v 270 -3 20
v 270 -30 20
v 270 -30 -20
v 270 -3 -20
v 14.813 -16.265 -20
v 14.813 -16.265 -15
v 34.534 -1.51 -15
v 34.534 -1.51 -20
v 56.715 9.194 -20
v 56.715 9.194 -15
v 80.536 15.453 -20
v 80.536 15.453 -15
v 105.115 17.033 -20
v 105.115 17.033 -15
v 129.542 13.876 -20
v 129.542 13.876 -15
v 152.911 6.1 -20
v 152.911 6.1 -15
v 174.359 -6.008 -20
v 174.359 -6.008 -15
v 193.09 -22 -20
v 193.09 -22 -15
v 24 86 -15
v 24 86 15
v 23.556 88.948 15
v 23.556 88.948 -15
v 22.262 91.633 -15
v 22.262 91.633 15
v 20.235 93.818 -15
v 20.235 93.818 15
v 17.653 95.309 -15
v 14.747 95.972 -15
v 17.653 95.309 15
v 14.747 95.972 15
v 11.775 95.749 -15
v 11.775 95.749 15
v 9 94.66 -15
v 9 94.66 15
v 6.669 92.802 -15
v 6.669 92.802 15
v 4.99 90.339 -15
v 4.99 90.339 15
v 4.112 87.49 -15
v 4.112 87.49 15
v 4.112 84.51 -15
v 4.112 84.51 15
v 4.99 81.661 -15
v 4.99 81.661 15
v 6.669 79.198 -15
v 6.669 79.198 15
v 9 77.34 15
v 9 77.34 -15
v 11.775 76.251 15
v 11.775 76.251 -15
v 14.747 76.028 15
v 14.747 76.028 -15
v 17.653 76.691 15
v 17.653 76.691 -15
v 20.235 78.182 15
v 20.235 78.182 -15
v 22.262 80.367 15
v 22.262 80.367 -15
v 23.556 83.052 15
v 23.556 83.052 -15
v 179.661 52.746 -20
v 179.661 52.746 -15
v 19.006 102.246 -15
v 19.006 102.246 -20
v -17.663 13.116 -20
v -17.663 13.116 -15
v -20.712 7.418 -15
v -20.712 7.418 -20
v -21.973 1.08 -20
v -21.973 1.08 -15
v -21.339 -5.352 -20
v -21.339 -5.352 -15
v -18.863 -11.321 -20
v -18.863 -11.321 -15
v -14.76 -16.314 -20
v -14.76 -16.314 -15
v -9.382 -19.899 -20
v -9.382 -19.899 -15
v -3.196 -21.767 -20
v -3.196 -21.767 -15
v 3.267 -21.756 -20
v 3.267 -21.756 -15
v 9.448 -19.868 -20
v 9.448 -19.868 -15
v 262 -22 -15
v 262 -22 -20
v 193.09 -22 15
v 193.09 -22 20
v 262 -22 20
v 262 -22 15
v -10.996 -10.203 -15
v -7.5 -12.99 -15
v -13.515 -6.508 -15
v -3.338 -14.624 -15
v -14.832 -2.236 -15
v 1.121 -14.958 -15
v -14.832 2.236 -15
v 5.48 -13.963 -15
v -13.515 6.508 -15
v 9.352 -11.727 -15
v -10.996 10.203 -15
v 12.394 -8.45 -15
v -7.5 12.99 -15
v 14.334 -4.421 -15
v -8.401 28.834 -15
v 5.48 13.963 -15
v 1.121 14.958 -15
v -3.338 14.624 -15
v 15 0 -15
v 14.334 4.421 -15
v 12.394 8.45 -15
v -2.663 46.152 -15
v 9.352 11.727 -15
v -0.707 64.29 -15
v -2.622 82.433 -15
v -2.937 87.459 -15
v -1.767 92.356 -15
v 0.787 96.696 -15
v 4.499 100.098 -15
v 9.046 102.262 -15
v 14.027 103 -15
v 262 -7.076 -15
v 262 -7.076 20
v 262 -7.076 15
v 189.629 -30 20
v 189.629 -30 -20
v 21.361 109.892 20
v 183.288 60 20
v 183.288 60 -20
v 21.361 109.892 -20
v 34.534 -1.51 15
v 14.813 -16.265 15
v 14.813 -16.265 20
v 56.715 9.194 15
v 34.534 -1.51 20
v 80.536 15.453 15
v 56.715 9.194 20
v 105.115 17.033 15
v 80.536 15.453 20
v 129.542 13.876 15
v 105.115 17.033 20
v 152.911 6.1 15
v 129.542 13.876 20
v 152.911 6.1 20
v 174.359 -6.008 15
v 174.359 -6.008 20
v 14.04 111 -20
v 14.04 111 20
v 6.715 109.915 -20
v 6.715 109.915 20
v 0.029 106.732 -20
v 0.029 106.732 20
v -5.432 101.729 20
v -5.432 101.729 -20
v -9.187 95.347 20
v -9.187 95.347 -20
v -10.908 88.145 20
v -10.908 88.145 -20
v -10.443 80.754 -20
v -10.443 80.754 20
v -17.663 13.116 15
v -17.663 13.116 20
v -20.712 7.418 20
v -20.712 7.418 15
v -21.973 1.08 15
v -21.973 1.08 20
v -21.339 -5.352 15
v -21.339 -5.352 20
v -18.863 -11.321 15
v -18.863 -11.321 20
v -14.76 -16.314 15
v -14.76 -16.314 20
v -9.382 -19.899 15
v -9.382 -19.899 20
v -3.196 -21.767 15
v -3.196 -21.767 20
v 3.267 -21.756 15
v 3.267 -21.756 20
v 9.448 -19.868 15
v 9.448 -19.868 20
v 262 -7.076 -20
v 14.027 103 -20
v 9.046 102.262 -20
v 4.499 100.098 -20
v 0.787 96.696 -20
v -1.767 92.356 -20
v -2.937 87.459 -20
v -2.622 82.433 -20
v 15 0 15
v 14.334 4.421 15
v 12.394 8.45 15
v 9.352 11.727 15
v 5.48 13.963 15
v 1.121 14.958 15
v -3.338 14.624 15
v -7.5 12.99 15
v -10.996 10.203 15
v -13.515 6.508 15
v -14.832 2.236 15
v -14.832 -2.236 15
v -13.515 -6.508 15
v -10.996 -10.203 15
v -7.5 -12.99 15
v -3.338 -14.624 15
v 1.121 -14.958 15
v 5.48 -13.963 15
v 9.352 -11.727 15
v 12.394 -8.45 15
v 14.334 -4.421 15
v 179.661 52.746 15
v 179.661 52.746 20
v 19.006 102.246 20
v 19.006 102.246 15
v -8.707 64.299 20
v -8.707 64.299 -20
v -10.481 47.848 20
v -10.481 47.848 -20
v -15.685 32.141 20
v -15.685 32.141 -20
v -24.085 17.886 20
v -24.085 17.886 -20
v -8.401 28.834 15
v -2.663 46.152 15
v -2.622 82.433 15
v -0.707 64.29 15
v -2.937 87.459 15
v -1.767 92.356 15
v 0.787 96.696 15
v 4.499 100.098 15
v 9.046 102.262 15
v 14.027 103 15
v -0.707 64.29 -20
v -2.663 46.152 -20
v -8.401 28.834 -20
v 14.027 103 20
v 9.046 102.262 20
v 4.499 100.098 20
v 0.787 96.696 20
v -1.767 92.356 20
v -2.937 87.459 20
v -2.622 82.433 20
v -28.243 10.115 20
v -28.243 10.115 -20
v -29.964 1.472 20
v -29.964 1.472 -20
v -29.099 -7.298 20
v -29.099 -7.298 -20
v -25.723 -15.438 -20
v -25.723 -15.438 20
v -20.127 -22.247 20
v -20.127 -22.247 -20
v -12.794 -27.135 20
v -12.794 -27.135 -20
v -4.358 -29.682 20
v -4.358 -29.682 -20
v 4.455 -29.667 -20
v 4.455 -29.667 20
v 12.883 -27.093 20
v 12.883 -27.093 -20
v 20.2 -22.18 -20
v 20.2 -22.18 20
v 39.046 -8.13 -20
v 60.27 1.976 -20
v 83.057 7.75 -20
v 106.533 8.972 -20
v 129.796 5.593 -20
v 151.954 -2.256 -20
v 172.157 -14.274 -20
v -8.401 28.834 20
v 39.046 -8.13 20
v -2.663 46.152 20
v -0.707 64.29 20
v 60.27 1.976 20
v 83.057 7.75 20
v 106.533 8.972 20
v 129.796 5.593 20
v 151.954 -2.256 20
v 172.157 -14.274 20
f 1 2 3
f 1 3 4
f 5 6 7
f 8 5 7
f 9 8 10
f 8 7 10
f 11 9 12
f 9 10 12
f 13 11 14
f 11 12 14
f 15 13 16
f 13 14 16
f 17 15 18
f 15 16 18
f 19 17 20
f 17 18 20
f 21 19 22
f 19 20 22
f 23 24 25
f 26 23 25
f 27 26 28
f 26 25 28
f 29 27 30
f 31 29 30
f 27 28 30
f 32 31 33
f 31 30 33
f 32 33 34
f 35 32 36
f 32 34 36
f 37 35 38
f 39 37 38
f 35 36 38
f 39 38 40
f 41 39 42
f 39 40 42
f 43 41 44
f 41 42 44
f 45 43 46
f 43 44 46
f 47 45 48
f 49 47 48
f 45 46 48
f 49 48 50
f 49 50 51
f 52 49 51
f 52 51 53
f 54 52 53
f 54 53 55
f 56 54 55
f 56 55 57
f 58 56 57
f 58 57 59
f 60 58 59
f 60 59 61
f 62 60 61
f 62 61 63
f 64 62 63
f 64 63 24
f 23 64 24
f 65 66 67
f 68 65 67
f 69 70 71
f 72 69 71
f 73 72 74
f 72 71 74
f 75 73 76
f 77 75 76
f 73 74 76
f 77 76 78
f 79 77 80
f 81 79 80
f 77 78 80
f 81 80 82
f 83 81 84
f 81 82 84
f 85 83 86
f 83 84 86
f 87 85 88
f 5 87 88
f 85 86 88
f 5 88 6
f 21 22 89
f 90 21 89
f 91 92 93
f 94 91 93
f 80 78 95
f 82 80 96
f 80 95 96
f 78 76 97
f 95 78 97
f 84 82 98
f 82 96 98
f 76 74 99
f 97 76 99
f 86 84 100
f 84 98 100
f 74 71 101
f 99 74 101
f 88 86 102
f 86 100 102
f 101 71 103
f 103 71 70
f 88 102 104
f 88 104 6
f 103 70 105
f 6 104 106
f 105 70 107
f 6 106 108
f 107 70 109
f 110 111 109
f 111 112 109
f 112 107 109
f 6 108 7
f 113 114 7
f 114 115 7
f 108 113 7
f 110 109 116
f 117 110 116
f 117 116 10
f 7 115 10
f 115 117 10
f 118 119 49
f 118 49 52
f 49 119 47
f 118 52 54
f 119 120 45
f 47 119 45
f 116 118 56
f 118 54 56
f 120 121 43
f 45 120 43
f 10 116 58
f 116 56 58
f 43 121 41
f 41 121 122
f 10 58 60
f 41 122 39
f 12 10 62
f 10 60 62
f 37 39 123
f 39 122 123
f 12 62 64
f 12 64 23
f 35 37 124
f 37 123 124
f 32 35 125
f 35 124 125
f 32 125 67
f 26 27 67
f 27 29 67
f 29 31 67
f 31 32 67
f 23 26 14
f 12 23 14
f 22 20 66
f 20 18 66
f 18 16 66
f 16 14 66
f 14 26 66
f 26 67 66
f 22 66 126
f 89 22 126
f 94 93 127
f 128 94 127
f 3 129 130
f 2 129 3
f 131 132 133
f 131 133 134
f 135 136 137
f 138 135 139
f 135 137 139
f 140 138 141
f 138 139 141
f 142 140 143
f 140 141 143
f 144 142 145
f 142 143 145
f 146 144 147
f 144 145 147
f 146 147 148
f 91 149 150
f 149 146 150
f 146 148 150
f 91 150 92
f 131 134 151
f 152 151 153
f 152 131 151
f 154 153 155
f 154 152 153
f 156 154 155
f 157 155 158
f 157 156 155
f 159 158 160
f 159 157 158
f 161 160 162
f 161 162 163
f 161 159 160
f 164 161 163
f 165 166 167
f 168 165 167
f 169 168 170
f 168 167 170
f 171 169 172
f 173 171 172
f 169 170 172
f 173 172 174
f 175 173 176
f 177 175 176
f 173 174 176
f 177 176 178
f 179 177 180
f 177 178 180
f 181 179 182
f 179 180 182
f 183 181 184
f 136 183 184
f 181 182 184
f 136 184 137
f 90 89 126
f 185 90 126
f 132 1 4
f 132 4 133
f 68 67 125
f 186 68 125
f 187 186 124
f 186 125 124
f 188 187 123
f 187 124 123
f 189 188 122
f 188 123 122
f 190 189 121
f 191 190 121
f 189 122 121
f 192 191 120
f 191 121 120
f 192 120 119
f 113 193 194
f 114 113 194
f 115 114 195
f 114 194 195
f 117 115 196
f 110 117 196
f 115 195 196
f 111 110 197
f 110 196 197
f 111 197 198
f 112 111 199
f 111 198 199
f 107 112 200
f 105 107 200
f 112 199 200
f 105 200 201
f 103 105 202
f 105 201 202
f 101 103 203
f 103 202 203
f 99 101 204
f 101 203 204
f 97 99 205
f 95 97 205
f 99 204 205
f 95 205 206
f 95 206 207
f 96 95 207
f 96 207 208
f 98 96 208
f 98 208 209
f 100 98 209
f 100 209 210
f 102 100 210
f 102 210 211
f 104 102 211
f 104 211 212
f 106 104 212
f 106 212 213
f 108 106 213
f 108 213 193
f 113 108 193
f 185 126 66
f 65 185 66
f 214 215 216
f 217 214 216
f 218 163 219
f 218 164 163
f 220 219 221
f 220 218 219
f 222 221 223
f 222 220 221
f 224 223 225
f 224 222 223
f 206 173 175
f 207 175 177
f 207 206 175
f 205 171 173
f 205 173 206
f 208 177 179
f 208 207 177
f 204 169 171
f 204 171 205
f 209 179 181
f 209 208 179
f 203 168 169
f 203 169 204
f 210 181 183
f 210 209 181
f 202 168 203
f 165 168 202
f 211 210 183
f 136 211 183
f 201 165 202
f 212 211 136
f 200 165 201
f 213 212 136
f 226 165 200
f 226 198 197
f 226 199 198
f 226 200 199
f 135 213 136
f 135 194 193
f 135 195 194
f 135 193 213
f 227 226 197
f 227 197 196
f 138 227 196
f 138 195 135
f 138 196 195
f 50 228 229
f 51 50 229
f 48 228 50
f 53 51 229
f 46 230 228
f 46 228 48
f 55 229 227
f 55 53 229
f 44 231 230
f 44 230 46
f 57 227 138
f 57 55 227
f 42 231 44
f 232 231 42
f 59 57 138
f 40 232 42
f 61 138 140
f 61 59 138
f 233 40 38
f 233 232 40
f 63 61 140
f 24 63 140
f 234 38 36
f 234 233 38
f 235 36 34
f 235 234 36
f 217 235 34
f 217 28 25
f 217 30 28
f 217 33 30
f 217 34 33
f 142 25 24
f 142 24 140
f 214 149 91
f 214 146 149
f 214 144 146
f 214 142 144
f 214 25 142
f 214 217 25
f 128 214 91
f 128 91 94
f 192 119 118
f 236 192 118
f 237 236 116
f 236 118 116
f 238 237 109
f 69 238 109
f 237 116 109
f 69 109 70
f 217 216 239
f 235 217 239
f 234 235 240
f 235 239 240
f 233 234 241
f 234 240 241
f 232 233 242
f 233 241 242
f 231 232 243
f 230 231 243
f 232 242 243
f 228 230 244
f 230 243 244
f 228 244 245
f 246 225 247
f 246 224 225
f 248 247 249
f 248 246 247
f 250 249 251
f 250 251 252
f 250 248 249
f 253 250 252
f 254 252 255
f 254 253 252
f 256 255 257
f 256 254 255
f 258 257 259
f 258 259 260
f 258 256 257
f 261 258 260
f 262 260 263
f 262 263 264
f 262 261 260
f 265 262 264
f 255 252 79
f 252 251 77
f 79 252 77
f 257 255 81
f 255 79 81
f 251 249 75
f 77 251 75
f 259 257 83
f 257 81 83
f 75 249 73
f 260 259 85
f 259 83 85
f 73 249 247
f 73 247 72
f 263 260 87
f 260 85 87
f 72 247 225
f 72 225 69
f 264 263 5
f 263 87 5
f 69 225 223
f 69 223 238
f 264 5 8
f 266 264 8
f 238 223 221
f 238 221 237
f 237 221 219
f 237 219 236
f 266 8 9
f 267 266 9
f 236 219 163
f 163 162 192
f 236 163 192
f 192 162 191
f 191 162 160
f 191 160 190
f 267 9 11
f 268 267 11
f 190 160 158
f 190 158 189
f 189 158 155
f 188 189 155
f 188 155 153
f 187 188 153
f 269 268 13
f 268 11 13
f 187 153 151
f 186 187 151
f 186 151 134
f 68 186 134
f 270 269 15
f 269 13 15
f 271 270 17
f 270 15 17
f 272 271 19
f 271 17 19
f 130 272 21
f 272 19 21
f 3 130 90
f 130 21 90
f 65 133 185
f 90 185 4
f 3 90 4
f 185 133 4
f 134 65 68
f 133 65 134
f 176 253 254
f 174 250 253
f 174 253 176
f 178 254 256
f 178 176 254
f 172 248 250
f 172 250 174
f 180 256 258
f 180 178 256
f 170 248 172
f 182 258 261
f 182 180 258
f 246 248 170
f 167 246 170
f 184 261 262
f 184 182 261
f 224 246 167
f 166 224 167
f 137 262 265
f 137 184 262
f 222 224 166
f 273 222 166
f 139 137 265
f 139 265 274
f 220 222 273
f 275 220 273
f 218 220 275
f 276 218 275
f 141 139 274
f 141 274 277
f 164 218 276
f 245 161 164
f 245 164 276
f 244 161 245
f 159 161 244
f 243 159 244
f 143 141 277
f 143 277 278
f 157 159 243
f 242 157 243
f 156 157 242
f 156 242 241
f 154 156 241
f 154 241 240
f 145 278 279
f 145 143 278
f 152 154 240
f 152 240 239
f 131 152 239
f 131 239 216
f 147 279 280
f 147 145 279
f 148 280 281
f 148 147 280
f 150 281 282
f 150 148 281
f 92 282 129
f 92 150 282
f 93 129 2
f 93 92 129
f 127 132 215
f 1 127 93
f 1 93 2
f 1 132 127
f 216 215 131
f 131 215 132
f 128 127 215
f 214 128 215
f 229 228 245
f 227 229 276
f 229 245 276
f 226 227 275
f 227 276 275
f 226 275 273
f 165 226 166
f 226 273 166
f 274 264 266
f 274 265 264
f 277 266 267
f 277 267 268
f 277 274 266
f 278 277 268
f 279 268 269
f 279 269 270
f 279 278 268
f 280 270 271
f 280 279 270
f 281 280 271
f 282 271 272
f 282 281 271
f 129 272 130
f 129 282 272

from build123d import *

# Parameters (mm, degrees)
SKETCH2_R           = 30
SKETCH2_R_2         = 25
BOSS_EXTRUDE1_DEPTH = 15
BOSS_EXTRUDE2_DEPTH = 20
SKETCH5_R           = 10
SKETCH5_R_2         = 15
CUT_EXTRUDE2_DEPTH  = 40


with BuildPart() as part:
    # Sketch2 → Boss-Extrude1 (new body, symmetric)
    with BuildSketch(Plane.XY):
        with BuildLine():
            Line((183.28793901, 60), (21.361321264, 109.891650199))
            ThreePointArc((21.361321264, 109.891650199), (34.112595949, 100.848686279), (39, 86))
            ThreePointArc((39, 86), (16.637488364, 61.139516193), (-10.44349241, 80.754461058))
            ThreePointArc((-10.44349241, 80.754461058), (-10.481072196, 47.848151082), (-24.085330203, 17.885660989))
            ThreePointArc((-24.085330203, 17.885660989), (9.419131964, 28.482976548), (30, 0))
            ThreePointArc((30, 0), (27.440845468, -12.124355653), (20.2, -22.180171325))
            ThreePointArc((20.2, -22.180171325), (106.532601106, 8.971535214), (189.628727834, -30))
            Line((189.628727834, -30), (270, -30))
            Line((270, -30), (270, -3))
            Line((270, -3), (183.28793901, 60))
        make_face()
        Circle(SKETCH2_R)
        with Locations((14, 86)):
            Circle(SKETCH2_R_2)
    extrude(amount=BOSS_EXTRUDE1_DEPTH, both=True)

    # Sketch4 → Boss-Extrude2 (add, symmetric)
    with BuildSketch(Plane.XY):
        with BuildLine():
            Line((189.628727834, -30), (270, -30))
            Line((270, -30), (270, -3))
            Line((270, -3), (183.28793901, 60))
            Line((183.28793901, 60), (21.361321264, 109.891650199))
            ThreePointArc((21.361321264, 109.891650199), (-2.887690503, 104.433825145), (-10.44349241, 80.754461058))
            ThreePointArc((-10.44349241, 80.754461058), (-10.481072196, 47.848151082), (-24.085330203, 17.885660989))
            ThreePointArc((-24.085330203, 17.885660989), (-20.126889413, -22.246535068), (20.2, -22.180171325))
            ThreePointArc((20.2, -22.180171325), (106.532601106, 8.971535214), (189.628727834, -30))
        make_face()
        with BuildLine():
            Line((193.090377844, -22), (262, -22))
            Line((262, -22), (262, -7.076203596))
            Line((262, -7.076203596), (179.661480345, 52.746232627))
            Line((179.661480345, 52.746232627), (19.00569846, 102.246322136))
            ThreePointArc((19.00569846, 102.246322136), (2.516370458, 98.535001099), (-2.621574839, 82.43303352))
            ThreePointArc((-2.621574839, 82.43303352), (-2.663008962, 46.151717392), (-17.662575482, 13.116151392))
            ThreePointArc((-17.662575482, 13.116151392), (-14.759718903, -16.314125717), (14.813333333, -16.265458972))
            ThreePointArc((14.813333333, -16.265458972), (105.1151782, 17.032975134), (193.090377844, -22))
        make_face(mode=Mode.SUBTRACT)
    extrude(amount=BOSS_EXTRUDE2_DEPTH, both=True)

    # Sketch5 → Cut-Extrude2 (cut)
    with BuildSketch(Plane.XY.offset(15)):
        with Locations((14, 86)):
            Circle(SKETCH5_R)
        Circle(SKETCH5_R_2)
    extrude(amount=-CUT_EXTRUDE2_DEPTH, mode=Mode.SUBTRACT)


solid = part.part
